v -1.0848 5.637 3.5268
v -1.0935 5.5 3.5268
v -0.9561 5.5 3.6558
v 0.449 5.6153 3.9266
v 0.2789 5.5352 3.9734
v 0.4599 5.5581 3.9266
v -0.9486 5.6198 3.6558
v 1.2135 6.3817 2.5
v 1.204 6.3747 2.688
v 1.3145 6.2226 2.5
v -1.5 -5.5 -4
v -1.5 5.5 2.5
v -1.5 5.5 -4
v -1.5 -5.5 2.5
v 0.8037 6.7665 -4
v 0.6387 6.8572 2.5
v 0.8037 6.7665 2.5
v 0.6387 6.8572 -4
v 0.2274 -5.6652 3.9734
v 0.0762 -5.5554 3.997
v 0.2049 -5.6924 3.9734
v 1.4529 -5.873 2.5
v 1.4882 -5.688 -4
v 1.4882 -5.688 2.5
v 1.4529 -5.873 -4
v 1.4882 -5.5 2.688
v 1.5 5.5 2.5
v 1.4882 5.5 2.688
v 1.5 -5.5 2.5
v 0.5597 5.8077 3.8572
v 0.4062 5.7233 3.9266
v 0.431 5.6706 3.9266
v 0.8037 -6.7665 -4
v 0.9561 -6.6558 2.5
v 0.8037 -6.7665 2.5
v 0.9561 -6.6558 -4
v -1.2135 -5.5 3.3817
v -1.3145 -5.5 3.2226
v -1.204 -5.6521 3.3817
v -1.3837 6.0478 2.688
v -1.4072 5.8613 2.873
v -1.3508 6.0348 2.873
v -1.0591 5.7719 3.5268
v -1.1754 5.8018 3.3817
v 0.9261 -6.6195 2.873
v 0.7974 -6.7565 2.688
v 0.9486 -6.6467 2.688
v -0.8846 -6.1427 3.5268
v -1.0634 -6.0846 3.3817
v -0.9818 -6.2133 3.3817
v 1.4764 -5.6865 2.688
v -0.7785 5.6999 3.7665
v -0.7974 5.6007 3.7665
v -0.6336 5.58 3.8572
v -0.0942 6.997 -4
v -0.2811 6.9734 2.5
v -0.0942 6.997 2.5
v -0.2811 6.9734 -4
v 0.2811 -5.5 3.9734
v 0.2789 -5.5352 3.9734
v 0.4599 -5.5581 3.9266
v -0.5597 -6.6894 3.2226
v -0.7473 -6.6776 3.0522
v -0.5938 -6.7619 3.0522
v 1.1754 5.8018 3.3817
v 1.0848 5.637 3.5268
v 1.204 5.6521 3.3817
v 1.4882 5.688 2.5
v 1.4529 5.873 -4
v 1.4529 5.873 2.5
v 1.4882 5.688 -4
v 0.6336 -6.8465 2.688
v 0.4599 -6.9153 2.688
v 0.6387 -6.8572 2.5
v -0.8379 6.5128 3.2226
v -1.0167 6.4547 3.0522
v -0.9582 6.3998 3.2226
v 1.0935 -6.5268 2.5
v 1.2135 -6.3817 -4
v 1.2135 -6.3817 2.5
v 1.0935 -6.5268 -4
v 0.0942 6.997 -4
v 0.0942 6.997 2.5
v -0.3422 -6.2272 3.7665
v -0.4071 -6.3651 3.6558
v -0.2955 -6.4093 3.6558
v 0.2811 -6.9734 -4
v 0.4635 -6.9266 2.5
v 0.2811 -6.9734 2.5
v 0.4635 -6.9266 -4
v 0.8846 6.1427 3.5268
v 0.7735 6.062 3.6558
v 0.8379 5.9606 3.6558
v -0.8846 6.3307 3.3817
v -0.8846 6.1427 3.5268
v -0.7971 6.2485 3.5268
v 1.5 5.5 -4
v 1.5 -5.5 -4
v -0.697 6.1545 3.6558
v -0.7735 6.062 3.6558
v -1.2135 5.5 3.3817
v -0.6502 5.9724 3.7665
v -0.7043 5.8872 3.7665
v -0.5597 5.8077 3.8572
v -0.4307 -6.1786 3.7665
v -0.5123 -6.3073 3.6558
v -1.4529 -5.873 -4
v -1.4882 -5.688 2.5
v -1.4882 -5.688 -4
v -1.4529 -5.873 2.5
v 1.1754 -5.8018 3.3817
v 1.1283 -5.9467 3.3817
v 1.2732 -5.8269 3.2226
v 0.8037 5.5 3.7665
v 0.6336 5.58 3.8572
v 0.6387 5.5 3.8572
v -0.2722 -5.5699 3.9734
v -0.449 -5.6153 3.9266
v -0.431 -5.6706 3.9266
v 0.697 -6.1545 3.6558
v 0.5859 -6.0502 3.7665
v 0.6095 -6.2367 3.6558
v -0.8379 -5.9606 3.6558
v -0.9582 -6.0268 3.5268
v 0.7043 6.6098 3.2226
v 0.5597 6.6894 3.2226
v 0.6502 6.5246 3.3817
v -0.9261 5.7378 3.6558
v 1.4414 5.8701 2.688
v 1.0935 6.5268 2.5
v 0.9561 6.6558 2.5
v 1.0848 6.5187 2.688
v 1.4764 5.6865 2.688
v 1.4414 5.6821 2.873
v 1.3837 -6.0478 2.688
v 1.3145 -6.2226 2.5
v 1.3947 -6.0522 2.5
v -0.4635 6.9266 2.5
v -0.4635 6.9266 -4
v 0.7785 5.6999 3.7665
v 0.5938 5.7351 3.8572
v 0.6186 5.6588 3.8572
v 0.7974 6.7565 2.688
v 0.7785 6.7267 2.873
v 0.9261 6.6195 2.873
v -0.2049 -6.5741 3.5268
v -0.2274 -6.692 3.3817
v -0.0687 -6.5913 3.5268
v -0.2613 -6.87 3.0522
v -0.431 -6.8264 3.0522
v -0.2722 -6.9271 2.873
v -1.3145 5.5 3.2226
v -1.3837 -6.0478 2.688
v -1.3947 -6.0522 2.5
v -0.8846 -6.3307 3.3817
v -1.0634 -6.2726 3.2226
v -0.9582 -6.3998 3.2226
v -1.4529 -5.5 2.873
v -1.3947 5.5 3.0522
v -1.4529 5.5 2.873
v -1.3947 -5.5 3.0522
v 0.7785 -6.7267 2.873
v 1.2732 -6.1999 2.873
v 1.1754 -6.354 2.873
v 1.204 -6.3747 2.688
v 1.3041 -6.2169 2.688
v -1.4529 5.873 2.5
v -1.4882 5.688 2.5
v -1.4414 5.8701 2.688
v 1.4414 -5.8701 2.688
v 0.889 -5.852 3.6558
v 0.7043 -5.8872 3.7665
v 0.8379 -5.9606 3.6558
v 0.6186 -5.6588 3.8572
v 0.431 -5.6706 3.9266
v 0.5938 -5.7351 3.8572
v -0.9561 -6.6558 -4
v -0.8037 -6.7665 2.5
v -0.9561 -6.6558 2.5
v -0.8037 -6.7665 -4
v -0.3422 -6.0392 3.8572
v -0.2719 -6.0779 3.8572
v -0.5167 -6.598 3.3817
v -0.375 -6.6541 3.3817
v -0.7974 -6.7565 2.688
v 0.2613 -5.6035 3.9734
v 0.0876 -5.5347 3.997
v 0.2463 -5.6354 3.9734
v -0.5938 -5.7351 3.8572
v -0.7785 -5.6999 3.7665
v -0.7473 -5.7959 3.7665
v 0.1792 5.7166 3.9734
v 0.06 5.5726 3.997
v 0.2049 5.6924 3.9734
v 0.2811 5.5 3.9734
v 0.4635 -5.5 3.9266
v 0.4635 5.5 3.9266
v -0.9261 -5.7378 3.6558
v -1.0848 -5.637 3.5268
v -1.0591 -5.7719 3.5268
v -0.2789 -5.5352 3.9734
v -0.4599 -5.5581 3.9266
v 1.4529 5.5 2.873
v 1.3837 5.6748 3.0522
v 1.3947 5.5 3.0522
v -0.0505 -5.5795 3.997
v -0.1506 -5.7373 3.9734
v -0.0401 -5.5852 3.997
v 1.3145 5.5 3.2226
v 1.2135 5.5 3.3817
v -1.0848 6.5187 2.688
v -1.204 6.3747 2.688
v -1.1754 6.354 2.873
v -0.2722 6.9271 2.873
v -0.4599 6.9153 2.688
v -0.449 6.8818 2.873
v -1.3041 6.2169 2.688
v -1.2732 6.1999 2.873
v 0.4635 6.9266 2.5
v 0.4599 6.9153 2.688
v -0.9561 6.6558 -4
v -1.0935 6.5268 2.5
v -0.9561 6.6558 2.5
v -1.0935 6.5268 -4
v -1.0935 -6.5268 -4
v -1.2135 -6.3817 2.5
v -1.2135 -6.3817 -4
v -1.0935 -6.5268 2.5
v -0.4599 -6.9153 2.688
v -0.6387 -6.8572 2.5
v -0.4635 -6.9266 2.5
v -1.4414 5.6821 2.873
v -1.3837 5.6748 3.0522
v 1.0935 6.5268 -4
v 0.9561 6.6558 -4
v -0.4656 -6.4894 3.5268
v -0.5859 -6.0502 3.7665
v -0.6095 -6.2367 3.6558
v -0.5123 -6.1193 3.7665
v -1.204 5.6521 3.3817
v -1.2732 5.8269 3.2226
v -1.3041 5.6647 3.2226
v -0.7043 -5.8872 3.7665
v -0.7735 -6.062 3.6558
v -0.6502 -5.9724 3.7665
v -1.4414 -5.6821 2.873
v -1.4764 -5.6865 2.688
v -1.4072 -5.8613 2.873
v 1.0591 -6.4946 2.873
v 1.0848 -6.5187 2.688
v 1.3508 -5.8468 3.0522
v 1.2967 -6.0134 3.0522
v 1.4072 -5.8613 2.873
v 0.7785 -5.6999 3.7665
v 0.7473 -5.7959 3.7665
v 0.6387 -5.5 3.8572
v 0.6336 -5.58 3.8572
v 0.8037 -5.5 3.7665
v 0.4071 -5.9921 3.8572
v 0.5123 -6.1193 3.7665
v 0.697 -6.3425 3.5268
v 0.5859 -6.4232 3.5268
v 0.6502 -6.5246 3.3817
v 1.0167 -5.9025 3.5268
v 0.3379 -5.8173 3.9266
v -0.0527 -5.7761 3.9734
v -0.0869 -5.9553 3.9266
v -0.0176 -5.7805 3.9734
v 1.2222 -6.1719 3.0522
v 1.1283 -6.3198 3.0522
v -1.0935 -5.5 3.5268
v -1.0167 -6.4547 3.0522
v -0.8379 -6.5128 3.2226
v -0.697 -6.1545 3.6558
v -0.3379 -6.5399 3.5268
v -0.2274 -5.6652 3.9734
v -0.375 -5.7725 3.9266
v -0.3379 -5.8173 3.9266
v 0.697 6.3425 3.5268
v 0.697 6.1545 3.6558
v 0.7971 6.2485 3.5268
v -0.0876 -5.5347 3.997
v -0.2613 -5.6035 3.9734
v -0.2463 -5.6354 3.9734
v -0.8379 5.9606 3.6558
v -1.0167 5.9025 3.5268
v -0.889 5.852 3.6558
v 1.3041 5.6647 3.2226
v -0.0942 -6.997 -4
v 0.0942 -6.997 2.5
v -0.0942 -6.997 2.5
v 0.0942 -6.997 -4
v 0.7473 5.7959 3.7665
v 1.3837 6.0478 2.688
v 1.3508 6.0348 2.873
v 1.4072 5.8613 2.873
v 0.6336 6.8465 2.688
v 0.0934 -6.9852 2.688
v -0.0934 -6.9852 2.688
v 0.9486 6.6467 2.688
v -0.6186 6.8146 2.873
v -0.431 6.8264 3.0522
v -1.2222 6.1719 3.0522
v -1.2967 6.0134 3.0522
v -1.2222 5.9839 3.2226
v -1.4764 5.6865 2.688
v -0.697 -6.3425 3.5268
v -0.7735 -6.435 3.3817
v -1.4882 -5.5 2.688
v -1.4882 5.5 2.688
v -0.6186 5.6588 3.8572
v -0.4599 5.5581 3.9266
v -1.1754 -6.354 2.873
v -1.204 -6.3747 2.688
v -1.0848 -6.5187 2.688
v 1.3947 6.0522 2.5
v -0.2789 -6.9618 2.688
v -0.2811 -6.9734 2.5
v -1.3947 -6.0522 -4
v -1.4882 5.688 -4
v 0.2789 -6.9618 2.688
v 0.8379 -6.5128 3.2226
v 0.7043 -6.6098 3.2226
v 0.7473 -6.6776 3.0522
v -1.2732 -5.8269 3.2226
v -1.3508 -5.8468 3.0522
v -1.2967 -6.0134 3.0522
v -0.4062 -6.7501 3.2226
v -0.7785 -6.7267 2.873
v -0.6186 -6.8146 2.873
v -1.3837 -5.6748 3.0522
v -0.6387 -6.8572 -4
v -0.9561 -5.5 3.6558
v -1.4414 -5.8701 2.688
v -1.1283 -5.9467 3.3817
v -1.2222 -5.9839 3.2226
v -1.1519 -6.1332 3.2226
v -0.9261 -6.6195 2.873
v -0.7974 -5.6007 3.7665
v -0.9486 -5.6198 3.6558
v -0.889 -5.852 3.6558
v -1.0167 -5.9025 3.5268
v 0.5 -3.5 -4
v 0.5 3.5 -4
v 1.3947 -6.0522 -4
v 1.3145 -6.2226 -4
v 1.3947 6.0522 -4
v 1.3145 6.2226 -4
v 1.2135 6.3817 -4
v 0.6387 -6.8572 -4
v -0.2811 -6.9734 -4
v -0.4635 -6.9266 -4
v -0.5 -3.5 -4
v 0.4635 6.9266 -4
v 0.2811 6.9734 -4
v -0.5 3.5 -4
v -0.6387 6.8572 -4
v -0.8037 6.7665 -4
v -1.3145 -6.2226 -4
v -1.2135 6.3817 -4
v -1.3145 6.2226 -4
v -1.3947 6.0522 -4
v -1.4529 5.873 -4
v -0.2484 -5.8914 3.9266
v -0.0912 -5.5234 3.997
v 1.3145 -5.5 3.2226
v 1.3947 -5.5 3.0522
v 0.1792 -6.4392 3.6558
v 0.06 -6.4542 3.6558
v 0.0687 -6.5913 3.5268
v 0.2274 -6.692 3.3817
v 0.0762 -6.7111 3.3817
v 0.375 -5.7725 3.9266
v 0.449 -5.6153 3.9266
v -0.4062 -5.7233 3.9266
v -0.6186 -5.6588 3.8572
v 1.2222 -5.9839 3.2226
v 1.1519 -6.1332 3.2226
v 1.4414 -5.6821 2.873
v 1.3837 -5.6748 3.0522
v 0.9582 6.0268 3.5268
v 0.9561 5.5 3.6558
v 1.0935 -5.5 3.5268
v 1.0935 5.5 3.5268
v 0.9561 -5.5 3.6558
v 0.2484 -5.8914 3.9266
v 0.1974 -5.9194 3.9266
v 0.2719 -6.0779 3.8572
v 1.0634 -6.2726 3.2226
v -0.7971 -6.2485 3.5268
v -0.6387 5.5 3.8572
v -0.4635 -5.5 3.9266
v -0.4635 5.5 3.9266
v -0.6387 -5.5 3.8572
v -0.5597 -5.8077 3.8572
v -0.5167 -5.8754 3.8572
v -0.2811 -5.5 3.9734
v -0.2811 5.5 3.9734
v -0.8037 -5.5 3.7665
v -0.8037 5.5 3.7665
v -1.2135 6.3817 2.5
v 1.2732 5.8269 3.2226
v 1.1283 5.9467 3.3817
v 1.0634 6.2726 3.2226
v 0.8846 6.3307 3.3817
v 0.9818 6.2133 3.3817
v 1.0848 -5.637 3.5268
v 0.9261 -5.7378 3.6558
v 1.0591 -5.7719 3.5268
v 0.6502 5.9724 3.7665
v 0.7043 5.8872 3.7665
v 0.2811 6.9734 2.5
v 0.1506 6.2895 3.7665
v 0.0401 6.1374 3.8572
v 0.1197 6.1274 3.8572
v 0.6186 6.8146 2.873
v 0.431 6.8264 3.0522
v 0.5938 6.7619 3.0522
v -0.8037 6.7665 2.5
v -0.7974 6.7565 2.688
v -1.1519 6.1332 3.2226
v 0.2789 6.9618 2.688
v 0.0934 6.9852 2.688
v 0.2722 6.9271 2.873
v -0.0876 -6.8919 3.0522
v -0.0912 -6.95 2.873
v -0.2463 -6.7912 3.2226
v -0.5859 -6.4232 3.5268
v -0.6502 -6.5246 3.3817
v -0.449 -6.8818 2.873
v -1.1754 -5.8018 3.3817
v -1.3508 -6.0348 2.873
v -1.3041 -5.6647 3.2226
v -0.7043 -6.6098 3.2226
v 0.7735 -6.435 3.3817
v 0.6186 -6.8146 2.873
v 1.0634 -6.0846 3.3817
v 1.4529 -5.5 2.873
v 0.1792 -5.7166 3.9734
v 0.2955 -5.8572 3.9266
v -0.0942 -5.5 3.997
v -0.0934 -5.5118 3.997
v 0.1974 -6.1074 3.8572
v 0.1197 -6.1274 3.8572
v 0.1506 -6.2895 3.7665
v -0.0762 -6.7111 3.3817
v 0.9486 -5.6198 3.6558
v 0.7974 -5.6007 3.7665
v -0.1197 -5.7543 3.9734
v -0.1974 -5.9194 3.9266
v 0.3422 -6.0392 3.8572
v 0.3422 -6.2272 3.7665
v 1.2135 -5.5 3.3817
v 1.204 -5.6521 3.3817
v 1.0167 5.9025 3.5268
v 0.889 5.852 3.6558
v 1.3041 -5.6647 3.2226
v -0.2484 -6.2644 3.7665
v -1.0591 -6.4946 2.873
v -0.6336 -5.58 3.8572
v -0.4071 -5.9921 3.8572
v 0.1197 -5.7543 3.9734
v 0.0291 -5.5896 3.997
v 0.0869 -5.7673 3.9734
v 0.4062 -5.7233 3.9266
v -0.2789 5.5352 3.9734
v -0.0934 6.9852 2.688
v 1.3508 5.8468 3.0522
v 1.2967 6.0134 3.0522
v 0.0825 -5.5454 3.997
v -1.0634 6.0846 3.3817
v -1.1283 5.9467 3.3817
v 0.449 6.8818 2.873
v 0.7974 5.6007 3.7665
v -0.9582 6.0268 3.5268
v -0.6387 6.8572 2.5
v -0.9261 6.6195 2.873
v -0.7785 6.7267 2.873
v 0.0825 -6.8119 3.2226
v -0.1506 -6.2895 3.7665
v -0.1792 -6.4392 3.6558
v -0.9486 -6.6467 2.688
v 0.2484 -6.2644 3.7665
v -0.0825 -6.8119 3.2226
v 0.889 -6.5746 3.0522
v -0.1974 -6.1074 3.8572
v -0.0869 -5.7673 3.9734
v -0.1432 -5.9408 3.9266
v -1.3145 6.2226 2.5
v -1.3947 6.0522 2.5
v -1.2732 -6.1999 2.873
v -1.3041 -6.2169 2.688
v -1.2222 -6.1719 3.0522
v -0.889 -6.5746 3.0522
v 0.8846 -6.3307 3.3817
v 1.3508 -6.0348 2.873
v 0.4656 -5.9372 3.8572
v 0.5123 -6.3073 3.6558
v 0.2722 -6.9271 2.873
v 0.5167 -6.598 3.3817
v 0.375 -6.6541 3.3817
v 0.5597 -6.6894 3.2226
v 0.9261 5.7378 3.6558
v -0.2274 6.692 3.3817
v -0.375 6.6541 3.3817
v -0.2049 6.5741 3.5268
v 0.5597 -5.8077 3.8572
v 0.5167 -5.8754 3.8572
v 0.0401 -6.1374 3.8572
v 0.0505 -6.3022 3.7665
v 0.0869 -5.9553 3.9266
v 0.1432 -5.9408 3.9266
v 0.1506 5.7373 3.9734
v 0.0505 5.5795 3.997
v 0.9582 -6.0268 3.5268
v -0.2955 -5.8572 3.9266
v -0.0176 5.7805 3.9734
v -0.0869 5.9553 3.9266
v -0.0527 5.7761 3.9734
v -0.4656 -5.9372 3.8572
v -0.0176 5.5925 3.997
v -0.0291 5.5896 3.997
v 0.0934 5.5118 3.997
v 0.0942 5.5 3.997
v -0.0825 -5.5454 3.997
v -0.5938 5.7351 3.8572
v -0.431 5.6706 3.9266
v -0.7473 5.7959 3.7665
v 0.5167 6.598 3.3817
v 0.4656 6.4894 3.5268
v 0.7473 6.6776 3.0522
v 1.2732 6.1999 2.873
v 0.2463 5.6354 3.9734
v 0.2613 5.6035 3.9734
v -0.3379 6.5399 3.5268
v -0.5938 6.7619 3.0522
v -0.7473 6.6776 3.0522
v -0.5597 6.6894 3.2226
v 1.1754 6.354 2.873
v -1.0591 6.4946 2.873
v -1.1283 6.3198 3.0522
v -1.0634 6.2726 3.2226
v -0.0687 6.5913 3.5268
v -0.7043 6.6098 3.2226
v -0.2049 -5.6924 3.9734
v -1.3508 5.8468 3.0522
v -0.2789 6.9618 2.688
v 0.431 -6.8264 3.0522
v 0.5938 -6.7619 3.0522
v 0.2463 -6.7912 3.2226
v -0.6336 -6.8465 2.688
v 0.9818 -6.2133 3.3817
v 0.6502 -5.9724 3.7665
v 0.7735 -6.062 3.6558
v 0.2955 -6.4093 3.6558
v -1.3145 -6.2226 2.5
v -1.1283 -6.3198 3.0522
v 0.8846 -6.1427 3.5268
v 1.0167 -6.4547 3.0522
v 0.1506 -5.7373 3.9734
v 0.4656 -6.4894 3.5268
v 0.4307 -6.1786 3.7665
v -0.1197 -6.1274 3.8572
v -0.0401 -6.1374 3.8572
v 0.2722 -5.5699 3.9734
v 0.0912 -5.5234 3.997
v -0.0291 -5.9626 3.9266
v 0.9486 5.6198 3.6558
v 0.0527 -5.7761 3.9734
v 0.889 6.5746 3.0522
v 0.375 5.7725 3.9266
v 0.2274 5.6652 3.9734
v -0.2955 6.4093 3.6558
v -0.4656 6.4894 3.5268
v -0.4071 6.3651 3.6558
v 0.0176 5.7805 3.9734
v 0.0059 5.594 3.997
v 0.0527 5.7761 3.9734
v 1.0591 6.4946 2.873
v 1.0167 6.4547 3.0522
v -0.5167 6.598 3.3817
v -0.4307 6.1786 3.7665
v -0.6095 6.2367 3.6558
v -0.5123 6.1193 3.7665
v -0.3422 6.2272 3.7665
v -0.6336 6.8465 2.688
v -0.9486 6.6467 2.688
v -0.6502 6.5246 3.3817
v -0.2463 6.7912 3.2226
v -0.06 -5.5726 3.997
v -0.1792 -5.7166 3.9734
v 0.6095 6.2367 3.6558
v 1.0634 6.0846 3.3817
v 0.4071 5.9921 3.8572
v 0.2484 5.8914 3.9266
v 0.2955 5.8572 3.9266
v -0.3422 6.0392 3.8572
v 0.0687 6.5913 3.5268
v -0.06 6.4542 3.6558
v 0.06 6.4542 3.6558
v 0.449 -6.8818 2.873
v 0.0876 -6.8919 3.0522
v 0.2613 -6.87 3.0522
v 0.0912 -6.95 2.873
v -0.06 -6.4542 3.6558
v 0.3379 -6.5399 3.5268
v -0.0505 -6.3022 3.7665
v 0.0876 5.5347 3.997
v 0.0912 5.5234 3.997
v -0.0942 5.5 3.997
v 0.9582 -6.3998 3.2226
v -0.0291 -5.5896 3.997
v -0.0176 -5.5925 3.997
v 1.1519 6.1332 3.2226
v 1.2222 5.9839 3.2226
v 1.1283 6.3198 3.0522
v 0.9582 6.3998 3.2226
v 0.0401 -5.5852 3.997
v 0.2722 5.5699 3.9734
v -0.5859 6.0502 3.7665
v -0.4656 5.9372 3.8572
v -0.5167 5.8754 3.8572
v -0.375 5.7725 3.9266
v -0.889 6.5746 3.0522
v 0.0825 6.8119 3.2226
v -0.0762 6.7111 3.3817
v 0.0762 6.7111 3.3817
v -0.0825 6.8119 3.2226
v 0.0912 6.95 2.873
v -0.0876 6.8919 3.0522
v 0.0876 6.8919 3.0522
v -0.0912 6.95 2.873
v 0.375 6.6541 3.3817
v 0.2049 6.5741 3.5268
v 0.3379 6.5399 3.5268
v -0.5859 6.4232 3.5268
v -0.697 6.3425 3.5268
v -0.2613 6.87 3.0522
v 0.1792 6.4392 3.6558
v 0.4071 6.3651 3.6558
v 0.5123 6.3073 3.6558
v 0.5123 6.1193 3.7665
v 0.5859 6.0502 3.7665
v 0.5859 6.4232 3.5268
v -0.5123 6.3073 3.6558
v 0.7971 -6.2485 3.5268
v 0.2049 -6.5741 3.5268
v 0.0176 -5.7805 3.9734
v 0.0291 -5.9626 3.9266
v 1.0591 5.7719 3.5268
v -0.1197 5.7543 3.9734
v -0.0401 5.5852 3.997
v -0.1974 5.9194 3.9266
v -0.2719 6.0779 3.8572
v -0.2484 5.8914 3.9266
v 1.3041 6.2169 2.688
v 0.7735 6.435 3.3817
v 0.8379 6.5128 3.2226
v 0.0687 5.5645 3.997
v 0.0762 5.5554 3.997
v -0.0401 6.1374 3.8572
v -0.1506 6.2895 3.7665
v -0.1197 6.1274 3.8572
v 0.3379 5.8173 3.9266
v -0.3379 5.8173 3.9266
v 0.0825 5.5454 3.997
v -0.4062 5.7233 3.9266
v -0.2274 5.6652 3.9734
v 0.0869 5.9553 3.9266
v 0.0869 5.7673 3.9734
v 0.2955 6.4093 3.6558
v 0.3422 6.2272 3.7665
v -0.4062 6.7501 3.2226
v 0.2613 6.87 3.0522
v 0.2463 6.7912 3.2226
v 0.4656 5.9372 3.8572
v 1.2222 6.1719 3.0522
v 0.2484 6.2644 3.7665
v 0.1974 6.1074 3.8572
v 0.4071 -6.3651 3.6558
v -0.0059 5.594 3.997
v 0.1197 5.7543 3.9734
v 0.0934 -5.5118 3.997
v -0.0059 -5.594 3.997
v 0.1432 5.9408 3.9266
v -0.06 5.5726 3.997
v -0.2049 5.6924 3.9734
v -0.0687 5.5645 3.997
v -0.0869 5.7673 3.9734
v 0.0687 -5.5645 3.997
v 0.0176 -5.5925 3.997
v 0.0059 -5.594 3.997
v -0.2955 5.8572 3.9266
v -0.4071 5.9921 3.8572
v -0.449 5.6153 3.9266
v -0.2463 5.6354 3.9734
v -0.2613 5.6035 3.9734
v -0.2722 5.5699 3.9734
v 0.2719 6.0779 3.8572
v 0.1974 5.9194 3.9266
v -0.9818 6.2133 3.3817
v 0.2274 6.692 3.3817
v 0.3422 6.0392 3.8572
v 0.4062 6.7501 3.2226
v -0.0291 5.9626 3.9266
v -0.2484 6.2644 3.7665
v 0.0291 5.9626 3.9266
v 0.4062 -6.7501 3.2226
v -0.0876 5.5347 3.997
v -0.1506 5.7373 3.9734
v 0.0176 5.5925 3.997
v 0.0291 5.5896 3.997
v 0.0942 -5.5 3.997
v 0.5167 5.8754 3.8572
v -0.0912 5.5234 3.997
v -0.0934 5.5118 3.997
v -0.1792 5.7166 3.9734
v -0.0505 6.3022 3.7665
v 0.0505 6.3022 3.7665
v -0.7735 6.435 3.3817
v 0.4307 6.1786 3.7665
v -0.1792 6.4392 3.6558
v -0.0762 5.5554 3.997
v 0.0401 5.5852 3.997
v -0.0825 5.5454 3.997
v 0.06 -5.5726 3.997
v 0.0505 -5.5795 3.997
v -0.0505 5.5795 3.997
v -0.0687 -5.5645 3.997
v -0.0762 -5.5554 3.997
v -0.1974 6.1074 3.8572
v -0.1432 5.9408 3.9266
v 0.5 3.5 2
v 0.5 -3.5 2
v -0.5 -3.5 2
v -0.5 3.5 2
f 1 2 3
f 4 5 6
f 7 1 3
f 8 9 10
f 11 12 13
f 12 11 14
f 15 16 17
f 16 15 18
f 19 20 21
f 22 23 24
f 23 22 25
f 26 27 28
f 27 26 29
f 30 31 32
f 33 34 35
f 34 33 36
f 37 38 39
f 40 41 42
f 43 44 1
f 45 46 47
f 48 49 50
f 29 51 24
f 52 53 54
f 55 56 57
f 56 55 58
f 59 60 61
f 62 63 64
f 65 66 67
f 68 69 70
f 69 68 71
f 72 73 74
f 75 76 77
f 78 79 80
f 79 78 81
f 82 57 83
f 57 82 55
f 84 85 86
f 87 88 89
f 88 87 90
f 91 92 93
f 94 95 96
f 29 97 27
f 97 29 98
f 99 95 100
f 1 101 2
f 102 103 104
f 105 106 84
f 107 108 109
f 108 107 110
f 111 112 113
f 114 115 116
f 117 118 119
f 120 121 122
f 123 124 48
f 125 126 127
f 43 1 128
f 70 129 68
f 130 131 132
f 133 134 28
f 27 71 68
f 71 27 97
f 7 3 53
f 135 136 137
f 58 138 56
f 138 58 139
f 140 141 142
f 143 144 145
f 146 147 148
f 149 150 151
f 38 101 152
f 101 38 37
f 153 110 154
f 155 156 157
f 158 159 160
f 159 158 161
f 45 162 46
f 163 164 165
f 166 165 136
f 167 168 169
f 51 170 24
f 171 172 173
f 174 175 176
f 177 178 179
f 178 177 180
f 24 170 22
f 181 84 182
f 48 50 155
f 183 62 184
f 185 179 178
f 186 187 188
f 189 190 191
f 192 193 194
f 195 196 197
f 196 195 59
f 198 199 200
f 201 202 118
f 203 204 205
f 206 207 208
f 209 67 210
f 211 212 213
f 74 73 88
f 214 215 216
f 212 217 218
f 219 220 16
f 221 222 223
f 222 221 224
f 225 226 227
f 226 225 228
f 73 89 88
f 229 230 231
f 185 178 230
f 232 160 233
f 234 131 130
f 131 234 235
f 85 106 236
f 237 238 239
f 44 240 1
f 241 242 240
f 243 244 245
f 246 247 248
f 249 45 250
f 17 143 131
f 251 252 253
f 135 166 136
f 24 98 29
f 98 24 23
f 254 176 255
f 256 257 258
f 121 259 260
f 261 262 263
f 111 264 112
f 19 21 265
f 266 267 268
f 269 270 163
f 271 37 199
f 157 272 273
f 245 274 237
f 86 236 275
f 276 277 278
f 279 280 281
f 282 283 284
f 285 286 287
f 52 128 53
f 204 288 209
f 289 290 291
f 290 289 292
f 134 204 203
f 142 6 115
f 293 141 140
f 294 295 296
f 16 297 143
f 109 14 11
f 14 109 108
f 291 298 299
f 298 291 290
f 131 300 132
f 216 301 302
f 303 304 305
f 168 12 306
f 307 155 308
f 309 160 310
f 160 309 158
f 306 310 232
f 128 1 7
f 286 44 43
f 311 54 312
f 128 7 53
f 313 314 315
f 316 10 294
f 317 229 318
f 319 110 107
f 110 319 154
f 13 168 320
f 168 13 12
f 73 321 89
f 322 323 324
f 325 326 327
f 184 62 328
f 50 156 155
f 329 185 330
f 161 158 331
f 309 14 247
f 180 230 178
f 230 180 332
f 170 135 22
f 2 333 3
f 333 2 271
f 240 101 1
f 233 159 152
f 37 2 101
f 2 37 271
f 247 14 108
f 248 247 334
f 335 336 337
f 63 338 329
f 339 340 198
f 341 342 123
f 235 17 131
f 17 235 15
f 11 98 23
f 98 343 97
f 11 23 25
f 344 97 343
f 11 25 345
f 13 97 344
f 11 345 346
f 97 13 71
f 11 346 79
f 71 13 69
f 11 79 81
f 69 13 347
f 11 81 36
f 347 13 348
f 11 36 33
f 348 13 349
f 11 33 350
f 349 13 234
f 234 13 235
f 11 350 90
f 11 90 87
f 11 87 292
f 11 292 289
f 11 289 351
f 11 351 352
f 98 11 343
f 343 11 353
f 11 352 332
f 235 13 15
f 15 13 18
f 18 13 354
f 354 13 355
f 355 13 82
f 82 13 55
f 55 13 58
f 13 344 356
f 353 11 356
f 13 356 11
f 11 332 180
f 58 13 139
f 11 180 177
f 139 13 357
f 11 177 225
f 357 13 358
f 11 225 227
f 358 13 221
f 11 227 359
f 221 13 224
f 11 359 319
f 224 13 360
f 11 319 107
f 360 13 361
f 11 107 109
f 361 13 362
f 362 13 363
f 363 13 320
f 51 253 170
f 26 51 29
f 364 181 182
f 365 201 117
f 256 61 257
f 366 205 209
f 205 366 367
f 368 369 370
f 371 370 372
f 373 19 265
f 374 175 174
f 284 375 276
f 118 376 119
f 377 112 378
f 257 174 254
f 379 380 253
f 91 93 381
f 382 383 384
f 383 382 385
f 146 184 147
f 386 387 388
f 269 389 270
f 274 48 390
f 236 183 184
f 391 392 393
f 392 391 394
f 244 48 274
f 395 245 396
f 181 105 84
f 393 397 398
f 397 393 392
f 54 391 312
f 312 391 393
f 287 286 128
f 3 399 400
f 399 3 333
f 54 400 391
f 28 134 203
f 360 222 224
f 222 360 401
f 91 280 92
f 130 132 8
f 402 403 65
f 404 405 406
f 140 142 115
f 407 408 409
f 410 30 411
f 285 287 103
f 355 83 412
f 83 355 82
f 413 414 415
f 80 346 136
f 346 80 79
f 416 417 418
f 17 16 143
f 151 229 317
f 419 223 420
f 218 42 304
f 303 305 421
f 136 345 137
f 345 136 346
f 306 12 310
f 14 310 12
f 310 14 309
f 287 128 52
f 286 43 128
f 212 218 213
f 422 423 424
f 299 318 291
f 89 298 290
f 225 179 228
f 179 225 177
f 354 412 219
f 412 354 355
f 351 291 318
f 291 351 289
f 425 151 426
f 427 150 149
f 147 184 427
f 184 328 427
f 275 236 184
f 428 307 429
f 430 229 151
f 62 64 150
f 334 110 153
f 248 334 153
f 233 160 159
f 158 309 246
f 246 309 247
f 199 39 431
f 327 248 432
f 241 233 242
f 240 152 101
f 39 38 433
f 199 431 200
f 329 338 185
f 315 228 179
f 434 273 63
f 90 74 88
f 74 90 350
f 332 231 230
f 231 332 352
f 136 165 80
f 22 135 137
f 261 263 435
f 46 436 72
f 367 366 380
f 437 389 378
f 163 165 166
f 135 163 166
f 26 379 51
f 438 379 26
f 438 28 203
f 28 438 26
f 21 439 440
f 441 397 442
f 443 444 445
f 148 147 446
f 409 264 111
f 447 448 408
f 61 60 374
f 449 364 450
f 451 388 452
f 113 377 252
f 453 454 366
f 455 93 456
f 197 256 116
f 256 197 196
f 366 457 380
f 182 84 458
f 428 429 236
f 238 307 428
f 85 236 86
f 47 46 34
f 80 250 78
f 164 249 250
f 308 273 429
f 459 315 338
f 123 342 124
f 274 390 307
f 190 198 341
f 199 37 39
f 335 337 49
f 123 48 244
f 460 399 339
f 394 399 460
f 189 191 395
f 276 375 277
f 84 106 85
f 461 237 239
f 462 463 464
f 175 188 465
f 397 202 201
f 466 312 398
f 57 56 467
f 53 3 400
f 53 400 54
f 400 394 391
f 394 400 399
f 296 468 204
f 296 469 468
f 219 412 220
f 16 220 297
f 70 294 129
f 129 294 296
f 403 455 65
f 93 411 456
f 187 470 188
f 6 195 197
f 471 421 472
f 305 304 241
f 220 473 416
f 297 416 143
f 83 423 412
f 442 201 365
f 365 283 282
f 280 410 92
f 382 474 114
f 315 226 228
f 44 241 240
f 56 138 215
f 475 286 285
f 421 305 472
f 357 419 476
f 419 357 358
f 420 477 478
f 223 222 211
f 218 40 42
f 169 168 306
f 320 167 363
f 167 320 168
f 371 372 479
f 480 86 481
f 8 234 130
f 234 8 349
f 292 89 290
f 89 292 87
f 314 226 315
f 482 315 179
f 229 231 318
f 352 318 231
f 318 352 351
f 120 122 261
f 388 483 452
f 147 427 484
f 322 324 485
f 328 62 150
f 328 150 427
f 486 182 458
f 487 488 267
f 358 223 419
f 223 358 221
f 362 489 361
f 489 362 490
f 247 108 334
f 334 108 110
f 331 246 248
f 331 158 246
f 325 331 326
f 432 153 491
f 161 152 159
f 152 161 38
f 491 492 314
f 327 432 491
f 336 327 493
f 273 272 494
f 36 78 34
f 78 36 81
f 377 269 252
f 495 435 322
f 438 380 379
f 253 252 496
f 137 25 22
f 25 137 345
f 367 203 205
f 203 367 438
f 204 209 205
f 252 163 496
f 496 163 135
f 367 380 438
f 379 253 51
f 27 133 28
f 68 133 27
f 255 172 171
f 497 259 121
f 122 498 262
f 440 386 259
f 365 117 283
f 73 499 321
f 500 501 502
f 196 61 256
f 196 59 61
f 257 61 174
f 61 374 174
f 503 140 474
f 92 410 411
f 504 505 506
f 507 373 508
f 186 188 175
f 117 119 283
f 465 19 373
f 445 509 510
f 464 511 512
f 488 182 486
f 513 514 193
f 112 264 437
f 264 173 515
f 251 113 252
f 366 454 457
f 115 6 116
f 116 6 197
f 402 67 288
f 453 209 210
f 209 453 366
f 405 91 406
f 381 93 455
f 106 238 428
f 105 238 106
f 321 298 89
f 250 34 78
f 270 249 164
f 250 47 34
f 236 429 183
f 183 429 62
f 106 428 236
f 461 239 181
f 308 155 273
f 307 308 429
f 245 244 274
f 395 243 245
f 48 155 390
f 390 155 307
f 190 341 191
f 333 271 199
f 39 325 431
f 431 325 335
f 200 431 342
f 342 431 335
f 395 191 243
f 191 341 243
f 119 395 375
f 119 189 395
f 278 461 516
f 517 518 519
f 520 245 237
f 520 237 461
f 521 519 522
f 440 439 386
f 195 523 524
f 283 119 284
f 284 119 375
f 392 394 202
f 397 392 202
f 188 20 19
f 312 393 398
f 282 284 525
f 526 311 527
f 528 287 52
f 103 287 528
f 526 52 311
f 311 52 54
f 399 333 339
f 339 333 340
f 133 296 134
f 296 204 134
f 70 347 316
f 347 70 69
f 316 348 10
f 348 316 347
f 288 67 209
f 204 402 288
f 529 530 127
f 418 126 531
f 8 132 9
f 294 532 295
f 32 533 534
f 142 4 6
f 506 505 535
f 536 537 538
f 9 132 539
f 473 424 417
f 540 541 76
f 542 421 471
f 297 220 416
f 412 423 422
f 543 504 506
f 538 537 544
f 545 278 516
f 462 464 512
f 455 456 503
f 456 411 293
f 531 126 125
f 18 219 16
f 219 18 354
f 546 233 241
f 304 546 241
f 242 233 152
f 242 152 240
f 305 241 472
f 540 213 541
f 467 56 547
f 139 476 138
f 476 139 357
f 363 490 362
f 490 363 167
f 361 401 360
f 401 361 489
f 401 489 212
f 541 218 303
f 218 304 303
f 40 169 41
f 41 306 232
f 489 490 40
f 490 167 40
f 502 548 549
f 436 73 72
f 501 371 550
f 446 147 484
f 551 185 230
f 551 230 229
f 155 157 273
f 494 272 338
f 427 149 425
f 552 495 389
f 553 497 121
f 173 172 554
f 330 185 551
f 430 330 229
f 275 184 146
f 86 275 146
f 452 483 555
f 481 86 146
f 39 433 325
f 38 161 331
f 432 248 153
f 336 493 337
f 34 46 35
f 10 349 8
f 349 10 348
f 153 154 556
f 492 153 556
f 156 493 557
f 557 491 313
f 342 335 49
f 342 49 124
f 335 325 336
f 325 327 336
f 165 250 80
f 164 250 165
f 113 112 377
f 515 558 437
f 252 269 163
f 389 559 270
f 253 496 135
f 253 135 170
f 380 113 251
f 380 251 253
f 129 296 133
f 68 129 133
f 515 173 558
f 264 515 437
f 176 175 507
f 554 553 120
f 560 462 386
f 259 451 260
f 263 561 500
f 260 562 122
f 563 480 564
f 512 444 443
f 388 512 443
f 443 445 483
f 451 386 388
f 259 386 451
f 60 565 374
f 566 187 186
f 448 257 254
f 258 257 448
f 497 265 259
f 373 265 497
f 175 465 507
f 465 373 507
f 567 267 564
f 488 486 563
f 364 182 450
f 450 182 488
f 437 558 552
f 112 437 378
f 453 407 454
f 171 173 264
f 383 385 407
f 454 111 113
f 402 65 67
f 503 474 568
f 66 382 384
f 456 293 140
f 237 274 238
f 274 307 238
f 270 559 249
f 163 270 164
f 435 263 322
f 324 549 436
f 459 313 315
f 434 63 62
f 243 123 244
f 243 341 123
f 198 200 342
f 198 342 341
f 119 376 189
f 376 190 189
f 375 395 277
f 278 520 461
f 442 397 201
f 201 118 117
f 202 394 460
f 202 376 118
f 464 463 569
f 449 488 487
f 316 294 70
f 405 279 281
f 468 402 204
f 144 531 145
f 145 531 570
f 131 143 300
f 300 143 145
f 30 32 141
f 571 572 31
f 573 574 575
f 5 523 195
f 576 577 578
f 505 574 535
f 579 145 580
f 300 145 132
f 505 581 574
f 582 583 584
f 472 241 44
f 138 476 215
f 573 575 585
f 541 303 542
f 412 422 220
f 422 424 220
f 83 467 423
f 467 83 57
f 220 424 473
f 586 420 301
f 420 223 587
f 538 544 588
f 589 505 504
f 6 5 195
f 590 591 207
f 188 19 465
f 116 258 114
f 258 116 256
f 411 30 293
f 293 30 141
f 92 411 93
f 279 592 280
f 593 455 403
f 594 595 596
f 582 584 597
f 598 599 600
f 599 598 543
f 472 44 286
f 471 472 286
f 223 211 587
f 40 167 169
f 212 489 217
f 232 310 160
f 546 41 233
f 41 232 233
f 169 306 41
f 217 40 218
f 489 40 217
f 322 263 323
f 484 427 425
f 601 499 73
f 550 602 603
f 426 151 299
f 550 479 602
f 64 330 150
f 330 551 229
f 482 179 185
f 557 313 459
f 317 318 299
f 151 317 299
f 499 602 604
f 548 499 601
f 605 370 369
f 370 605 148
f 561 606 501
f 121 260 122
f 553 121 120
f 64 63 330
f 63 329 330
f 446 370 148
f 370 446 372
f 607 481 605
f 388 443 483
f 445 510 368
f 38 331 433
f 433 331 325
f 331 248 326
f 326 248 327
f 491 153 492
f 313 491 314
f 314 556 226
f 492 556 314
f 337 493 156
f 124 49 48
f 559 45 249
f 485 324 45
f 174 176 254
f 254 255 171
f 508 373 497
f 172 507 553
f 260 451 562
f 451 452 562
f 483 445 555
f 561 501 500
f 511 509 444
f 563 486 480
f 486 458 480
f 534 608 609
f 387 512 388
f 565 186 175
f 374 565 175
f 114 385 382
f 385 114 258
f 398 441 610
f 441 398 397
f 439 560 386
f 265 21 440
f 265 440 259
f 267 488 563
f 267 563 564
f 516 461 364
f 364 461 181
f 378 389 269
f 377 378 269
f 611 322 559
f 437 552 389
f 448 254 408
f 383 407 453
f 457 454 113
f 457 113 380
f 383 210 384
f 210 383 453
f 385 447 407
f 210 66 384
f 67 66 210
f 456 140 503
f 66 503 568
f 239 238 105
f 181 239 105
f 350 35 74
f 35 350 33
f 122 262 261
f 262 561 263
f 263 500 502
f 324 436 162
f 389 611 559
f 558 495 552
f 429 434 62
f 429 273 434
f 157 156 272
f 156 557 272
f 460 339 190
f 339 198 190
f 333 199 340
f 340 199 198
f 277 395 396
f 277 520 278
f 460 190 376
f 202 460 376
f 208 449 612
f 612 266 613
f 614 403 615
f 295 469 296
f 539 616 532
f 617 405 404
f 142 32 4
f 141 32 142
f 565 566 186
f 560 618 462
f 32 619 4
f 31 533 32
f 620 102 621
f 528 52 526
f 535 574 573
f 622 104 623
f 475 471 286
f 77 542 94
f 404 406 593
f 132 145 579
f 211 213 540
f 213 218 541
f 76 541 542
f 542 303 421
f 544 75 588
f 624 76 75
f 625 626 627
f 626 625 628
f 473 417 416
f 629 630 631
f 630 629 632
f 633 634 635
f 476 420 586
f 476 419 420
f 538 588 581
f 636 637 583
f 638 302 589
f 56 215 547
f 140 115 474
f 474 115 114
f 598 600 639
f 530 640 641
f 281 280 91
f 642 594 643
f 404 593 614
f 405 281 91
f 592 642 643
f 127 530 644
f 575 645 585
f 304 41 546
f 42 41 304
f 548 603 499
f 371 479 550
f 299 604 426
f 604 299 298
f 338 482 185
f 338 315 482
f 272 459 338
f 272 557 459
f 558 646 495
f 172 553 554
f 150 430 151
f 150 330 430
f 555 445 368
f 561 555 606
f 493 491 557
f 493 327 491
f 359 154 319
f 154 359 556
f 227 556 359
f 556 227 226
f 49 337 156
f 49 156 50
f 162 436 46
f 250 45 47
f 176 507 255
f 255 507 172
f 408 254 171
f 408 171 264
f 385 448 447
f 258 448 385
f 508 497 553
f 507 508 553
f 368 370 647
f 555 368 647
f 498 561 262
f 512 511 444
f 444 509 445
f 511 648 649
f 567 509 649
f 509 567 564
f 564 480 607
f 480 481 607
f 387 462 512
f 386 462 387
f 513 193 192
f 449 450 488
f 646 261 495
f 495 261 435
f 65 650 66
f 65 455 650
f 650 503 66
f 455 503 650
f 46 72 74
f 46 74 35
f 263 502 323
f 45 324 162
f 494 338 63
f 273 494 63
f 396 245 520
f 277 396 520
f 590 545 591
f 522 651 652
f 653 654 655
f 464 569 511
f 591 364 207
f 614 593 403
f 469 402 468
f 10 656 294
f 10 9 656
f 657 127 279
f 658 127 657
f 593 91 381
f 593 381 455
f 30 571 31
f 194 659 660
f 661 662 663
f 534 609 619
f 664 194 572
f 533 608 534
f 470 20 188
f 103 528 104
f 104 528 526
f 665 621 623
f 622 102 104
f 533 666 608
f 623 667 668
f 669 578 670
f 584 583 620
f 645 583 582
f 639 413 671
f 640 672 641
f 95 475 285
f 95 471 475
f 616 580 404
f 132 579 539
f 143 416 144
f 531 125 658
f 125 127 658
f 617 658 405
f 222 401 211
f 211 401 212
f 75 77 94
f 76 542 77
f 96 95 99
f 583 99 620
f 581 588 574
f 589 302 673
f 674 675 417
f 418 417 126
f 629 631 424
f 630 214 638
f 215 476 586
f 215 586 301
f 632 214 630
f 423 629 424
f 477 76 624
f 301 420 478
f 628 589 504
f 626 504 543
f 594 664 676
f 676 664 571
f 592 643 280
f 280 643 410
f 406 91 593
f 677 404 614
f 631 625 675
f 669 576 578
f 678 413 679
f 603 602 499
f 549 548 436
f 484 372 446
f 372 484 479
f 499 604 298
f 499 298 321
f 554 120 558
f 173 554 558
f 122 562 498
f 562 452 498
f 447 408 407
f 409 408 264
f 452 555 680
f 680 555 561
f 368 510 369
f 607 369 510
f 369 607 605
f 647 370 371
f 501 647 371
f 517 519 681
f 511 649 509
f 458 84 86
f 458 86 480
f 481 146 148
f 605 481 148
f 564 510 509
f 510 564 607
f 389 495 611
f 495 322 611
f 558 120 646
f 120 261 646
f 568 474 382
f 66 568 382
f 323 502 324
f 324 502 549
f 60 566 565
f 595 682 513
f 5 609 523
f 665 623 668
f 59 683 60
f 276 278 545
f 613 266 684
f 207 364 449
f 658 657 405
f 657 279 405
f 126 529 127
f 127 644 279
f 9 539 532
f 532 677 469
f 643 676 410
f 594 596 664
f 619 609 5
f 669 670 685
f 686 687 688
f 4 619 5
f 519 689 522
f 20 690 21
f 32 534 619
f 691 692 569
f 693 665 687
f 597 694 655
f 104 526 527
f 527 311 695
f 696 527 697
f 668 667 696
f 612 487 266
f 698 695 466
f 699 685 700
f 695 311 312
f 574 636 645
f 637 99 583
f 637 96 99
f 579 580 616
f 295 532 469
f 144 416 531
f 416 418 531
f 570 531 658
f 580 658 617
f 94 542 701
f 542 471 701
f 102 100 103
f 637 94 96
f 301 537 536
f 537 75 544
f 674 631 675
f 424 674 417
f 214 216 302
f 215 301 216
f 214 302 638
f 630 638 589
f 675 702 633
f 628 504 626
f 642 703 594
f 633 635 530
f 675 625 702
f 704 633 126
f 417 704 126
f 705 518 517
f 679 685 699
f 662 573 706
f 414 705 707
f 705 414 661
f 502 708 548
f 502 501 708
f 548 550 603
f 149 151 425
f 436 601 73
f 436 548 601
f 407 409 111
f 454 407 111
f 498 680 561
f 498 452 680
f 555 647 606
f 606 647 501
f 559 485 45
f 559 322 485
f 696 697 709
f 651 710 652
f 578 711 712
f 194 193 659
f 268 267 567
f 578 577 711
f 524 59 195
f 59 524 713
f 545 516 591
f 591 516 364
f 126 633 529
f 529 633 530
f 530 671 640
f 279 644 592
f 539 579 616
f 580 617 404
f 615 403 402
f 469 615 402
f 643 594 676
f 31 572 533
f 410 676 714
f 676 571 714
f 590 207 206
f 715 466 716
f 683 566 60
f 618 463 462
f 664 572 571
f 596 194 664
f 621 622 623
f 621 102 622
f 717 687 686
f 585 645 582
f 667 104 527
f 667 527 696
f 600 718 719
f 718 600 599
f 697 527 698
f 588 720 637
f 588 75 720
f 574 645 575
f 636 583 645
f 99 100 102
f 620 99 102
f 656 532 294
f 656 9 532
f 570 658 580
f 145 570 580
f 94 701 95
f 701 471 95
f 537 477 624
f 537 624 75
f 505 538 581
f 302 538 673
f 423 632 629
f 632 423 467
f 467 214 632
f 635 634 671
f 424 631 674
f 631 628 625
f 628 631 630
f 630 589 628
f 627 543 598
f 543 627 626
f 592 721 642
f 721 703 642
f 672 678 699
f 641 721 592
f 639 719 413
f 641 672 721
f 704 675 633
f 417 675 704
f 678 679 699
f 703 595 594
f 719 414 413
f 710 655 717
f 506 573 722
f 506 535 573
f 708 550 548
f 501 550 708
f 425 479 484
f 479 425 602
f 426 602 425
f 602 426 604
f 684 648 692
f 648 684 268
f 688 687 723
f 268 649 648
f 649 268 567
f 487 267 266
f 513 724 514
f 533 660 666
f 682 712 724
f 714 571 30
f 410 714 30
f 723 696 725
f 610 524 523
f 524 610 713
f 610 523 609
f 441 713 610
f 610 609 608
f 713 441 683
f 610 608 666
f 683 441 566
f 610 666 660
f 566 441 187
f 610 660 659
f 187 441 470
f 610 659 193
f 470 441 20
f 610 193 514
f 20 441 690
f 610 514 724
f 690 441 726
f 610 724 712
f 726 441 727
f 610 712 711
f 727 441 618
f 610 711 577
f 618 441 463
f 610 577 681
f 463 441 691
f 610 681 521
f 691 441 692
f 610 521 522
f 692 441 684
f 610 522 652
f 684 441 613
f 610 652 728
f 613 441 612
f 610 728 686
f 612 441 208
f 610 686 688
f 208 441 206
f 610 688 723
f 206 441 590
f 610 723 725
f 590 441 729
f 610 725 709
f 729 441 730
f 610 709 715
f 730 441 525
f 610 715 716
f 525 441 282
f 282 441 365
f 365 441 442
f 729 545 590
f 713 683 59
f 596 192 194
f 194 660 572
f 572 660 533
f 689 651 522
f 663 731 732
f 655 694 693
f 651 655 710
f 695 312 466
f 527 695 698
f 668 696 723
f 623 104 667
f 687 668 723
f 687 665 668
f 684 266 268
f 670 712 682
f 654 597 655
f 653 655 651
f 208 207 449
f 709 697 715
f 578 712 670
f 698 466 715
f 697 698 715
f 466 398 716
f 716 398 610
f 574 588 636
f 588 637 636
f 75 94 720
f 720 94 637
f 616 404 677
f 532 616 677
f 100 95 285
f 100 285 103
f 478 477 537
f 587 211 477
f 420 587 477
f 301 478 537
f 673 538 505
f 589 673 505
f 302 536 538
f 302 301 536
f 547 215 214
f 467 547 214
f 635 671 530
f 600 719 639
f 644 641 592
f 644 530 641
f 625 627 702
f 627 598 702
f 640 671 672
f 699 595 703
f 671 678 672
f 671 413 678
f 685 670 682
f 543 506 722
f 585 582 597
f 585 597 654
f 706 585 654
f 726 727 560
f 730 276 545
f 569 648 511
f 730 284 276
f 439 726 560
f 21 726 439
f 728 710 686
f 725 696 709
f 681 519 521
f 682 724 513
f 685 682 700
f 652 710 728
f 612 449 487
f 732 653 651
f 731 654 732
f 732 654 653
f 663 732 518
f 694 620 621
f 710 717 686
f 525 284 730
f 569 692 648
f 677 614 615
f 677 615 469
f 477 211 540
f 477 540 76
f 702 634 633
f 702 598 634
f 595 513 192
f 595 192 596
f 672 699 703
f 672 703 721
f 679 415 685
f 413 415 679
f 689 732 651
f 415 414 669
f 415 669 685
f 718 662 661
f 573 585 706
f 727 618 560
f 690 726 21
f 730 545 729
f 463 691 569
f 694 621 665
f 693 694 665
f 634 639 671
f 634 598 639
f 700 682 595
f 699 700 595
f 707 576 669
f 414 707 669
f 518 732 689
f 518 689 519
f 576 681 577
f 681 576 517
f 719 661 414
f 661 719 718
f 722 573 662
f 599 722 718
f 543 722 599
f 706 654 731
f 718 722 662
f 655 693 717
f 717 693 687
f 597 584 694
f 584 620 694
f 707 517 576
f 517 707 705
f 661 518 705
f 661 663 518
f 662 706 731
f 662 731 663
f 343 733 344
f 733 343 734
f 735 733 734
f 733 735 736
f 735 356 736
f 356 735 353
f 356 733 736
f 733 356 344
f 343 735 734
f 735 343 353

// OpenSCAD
// [FL_INDEX: keywords="openscad, 3d_parametric, Tip_for_FitBit_One_Pocket_Clip, csg_solid" | COT="Parametric OpenSCAD design from 3DCodeverse"]
// Title: Tip for FitBit One Pocket Clip

width=3;
length=14;
height=8;
tab_width=1;
tab_length=7;
tab_height=6;
resolution=50;

$fn=resolution;

difference(){
  hull(){
    cube ([width,length-width*2,height-width],center=true);
    translate ([0,-length/2+width/2,height/2-width/2])
      sphere (r=width/2,center=true);  
    translate ([0,length/2-width/2,height/2-width/2])
      sphere (r=width/2,center=true);  
    translate ([0,-length/2+width/2,-height/2+.5])
      cylinder (r=width/2,h=1,center=true);
    translate ([0,length/2-width/2,-height/2+.5])
      cylinder (r=width/2,h=1,center=true);  
}
  translate ([0,0,(tab_height-height)/2])
    cube ([tab_width,tab_length,tab_height],center=true);  
}
